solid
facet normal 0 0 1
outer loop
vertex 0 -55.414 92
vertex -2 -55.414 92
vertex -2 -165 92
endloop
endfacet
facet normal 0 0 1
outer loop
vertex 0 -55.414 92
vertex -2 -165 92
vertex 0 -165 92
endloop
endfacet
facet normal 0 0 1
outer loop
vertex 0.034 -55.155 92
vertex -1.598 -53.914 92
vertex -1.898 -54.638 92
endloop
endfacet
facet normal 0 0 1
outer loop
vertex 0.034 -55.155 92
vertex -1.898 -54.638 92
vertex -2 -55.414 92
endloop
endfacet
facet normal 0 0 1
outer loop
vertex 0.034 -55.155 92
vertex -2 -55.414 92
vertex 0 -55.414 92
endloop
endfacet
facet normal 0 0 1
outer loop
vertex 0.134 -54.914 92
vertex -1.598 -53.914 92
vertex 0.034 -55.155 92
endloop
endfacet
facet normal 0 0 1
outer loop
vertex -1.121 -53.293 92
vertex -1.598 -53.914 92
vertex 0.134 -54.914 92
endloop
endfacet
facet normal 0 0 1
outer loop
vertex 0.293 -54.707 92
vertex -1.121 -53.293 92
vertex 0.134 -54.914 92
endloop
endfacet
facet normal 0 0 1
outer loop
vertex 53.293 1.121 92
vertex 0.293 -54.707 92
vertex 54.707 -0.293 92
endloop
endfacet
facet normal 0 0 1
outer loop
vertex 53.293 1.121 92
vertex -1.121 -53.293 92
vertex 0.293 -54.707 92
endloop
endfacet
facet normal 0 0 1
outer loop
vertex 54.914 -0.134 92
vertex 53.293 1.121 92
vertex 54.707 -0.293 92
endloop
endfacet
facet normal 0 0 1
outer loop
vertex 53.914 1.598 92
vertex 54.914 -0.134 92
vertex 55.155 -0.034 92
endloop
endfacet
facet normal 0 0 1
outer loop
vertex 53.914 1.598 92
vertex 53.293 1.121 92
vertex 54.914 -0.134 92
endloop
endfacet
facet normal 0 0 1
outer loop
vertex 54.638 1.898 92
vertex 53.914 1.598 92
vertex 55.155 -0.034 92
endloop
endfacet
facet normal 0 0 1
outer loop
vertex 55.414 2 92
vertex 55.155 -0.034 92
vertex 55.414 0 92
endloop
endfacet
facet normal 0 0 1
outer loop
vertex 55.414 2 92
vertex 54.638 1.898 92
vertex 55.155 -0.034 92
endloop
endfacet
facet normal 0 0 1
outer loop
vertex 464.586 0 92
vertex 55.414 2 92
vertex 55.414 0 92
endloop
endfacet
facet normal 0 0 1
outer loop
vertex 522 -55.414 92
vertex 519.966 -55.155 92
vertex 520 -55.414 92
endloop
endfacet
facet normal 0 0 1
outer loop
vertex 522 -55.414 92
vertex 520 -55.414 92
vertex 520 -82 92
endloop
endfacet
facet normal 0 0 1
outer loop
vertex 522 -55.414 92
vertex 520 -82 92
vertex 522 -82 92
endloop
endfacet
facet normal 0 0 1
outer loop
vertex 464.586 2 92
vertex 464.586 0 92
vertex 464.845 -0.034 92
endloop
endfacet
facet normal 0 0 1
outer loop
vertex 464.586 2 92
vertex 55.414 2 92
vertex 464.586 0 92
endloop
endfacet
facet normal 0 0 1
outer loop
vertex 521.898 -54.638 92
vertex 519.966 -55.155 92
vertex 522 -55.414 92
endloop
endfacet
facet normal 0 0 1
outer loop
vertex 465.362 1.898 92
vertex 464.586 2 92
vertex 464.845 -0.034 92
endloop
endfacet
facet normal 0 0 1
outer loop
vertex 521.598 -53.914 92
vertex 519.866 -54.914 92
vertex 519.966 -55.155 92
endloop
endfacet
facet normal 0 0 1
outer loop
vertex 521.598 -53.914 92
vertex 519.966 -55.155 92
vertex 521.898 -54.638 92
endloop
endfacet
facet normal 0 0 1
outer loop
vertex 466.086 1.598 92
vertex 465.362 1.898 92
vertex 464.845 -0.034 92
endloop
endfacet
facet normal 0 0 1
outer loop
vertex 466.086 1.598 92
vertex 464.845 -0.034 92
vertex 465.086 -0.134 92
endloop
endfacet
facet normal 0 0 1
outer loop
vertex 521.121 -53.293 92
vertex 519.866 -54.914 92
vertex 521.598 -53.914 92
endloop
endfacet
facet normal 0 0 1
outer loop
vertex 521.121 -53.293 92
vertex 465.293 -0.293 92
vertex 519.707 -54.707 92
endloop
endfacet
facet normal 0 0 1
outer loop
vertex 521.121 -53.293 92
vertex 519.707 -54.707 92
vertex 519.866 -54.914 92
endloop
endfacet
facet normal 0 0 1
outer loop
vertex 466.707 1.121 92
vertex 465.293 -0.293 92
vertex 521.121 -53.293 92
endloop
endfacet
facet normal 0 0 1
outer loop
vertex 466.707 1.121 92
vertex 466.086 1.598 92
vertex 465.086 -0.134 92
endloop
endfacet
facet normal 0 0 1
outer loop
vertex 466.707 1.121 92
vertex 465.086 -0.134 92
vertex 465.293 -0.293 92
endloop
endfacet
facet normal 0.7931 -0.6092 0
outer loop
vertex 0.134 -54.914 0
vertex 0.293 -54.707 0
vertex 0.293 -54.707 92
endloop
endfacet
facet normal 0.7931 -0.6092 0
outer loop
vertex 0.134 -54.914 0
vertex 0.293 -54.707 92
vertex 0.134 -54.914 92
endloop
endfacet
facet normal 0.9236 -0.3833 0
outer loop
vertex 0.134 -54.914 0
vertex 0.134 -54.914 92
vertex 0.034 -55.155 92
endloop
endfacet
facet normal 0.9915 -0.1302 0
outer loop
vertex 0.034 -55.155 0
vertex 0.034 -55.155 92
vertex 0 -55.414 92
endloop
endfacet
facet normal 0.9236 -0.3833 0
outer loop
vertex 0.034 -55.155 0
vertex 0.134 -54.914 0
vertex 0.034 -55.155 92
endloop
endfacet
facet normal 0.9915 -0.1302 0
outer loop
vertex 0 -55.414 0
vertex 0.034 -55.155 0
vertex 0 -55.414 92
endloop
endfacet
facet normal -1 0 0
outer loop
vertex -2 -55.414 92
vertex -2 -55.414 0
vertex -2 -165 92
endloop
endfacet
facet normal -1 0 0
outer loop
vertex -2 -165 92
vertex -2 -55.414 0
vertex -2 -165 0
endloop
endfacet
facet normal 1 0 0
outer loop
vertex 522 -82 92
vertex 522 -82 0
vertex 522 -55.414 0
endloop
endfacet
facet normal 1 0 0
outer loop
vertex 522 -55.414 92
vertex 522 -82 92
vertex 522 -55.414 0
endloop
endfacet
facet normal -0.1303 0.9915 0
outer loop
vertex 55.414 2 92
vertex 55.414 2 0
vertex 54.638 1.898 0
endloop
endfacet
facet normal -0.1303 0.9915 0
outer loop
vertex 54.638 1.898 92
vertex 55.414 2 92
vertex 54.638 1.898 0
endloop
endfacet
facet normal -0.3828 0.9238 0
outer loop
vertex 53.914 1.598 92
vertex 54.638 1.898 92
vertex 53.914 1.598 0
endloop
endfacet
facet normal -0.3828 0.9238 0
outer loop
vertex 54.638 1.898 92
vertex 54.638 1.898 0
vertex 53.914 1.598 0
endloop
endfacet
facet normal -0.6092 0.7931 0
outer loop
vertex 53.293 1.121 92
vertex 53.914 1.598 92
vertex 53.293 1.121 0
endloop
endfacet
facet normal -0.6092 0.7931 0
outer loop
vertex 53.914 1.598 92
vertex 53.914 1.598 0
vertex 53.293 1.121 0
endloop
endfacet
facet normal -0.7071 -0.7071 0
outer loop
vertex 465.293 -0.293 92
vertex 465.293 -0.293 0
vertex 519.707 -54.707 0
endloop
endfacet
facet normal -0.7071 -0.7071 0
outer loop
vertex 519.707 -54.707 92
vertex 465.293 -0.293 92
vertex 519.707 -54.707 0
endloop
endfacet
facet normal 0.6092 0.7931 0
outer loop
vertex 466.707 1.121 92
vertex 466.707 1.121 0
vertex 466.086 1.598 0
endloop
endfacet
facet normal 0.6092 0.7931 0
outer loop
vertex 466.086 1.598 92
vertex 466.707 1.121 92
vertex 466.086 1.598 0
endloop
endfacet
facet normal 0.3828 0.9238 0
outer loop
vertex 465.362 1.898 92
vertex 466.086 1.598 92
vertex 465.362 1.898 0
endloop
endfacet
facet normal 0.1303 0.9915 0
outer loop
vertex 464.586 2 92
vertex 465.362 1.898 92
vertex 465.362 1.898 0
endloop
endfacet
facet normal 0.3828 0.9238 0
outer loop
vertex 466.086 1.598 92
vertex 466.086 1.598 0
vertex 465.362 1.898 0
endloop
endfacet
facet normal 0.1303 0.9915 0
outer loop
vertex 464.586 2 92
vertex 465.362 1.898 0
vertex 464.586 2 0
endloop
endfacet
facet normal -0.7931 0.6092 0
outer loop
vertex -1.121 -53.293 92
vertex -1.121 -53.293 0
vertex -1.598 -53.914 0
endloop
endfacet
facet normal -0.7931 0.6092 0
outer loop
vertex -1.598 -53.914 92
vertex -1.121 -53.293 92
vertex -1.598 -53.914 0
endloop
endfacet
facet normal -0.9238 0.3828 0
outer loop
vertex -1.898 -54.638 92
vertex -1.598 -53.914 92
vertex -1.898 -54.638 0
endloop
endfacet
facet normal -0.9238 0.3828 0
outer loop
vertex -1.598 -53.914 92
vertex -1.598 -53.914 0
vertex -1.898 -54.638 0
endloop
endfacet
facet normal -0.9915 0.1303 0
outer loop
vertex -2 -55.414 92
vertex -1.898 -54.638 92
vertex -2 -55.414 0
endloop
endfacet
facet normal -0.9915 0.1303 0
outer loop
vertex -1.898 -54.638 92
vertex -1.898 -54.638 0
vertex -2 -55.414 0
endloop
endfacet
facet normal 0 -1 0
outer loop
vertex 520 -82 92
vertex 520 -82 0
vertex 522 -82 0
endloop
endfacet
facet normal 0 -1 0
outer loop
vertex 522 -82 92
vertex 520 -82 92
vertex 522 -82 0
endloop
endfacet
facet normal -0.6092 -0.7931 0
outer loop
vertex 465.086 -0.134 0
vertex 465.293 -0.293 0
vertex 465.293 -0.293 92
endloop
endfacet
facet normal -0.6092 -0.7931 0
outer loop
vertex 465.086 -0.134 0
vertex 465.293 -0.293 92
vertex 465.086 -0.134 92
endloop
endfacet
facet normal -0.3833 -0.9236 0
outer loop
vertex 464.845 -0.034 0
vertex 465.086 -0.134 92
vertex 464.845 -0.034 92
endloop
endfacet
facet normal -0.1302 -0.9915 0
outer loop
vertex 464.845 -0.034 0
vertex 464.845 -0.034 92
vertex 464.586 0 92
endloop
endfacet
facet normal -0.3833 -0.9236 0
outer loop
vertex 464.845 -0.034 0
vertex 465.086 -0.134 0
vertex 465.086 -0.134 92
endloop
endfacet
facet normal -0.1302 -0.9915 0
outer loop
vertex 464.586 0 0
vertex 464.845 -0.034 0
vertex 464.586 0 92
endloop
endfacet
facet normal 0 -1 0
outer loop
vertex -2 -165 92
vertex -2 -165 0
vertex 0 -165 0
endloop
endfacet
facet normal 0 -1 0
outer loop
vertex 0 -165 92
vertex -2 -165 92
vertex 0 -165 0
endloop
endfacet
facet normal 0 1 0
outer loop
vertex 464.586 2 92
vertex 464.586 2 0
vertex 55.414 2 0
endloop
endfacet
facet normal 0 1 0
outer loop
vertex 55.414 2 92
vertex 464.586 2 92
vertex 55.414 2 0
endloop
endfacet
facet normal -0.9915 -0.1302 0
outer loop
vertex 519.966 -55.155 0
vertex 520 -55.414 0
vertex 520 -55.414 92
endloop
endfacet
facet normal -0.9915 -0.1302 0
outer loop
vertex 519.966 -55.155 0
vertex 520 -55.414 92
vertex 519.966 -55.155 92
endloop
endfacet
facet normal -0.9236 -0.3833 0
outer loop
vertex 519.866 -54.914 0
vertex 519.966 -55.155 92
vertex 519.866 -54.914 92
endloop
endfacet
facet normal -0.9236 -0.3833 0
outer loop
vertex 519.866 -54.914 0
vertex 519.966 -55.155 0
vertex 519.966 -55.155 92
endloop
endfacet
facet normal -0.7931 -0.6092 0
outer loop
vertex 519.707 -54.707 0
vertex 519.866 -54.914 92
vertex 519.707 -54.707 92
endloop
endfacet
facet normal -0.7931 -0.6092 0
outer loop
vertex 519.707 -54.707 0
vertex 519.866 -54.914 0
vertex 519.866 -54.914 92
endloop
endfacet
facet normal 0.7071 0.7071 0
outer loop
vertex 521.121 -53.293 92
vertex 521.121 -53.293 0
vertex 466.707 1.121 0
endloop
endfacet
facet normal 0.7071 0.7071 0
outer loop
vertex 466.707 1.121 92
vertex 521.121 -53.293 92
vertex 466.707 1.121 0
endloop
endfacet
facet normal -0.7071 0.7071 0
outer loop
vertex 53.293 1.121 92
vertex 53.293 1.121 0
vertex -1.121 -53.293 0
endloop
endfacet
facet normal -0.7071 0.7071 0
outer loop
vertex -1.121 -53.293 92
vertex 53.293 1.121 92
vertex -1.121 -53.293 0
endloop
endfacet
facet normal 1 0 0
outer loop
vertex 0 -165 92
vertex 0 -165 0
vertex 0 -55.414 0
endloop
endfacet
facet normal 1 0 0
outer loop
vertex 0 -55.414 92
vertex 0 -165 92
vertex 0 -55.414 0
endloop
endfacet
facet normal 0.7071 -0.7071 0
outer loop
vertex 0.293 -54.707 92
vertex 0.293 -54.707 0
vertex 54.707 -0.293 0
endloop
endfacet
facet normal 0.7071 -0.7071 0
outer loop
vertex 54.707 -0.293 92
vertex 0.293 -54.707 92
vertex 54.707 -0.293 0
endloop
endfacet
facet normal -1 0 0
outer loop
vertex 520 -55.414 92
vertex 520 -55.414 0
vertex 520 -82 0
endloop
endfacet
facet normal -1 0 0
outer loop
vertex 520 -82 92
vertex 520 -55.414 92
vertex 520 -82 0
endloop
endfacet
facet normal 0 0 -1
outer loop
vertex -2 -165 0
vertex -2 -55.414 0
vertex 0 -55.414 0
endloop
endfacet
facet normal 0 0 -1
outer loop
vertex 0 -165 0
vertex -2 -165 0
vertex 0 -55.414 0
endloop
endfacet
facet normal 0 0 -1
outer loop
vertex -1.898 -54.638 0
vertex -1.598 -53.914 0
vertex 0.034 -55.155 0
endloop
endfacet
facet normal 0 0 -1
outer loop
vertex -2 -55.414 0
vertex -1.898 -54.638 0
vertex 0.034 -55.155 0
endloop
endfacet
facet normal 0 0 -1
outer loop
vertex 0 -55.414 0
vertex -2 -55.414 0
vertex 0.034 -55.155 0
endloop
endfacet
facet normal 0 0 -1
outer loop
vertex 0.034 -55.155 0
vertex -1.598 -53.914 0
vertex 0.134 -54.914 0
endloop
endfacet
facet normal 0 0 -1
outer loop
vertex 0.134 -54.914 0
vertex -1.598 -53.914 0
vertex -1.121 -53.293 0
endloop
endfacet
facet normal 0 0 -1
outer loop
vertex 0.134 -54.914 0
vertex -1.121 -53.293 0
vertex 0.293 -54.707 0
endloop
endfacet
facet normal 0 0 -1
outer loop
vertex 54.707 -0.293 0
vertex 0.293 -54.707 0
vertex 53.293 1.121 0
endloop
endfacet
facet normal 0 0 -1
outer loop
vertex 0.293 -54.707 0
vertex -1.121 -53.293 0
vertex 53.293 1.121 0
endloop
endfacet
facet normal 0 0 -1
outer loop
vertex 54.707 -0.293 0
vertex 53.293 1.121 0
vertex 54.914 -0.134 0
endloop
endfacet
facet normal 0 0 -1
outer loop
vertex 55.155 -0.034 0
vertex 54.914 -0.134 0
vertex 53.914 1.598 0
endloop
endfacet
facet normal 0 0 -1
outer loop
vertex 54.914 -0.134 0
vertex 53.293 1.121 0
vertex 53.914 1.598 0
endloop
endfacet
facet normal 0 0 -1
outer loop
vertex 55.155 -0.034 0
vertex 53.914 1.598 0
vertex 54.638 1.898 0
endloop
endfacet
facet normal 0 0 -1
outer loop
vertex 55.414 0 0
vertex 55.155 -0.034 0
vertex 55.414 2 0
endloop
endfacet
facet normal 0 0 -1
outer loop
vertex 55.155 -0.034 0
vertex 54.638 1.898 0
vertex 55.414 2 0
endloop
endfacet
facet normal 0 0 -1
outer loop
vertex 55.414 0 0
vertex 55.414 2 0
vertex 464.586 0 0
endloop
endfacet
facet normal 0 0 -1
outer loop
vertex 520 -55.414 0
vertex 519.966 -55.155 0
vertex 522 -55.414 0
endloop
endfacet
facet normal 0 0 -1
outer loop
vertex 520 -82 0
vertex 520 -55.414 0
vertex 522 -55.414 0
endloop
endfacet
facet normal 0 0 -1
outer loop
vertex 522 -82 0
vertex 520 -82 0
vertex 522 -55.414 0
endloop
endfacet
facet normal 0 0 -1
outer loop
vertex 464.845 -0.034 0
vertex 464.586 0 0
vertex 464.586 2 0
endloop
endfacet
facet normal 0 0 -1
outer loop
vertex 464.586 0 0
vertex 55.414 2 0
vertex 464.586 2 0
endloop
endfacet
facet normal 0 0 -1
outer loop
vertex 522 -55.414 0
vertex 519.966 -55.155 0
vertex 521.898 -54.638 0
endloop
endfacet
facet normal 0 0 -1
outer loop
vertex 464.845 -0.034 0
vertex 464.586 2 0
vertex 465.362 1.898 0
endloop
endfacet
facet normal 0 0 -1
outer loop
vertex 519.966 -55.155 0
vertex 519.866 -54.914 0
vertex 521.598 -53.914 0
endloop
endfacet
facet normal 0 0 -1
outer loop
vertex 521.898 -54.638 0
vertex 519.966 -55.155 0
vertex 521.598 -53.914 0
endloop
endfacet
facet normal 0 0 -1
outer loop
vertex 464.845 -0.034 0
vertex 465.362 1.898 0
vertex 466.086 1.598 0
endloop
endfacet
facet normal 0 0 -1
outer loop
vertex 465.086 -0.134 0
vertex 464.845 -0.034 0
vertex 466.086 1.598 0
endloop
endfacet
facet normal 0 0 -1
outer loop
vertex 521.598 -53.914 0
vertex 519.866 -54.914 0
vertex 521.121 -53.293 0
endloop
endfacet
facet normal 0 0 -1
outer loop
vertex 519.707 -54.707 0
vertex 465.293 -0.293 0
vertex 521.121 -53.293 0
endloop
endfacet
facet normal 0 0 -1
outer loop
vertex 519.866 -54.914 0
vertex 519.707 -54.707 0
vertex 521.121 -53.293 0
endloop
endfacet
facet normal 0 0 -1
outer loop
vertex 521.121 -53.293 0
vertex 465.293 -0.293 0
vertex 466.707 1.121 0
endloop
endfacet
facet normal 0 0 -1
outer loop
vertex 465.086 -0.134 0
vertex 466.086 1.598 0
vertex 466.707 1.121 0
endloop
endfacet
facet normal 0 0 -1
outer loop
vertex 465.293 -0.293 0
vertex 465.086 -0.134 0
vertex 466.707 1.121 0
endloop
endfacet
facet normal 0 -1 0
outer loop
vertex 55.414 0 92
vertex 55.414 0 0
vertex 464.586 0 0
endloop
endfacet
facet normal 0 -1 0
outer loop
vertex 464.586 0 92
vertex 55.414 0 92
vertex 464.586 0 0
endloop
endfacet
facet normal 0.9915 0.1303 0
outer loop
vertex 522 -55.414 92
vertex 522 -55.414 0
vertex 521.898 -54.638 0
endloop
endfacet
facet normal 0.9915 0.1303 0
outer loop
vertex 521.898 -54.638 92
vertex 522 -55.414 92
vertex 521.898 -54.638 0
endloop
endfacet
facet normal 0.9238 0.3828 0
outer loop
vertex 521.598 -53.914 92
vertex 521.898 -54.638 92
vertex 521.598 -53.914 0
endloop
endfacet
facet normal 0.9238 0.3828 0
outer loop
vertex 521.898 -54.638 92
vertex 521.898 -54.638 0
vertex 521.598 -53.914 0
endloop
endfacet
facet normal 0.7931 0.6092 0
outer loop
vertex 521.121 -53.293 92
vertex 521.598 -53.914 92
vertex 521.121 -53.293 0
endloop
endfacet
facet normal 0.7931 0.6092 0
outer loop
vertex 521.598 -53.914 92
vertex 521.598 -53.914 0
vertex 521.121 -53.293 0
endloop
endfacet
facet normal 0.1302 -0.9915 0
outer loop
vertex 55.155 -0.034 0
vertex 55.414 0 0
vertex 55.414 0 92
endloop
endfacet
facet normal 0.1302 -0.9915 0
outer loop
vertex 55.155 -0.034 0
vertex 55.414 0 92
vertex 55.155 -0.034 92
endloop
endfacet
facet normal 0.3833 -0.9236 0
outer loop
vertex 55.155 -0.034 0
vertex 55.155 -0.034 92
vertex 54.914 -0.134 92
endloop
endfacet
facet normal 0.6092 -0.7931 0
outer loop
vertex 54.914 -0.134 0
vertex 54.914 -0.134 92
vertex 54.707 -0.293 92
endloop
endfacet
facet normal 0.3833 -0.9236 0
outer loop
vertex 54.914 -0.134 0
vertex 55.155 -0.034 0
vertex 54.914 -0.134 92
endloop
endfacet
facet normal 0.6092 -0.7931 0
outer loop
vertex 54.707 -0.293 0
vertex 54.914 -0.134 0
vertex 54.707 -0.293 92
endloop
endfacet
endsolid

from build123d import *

# Parameters (mm, degrees)
EXTRU_MINCE1_DEPTH        = 92
CONVERTIR_VOLUME1_DEPTH   = 92
CONVERTIR_VOLUME1_2_DEPTH = 92


# Read off the part's stored shape, not the designer's step: Convertir-Volume1
with BuildPart() as part:
    # Esquisse1 → Extru.-Mince1 (new body)
    with BuildSketch(Plane.XY):
        Polygon((520, -82), (520, -55), (465, 0), (55, 0), (0, -55), (0, -165), (10, -165), (10, -59.142135624), (59.142135624, -10), (460.857864376, -10), (510, -59.142135624), (510, -82), align=None)
    extrude(amount=EXTRU_MINCE1_DEPTH)

    # Convertir-Volume1 outline → Convertir-Volume1 (cut)
    with BuildSketch(Plane.XY):
        with BuildLine():
            Line((0, -55.414213562), (0, -165))
            Line((0, -165), (10, -165))
            Line((10, -165), (10, -59.142135624))
            Line((10, -59.142135624), (59.142135624, -10))
            Line((59.142135624, -10), (460.857864376, -10))
            Line((460.857864376, -10), (510, -59.142135624))
            Line((510, -59.142135624), (510, -82))
            Line((510, -82), (520, -82))
            Line((520, -82), (520, -55.414213562))
            ThreePointArc((520, -55.414213562), (519.923879533, -55.03153013), (519.707106781, -54.707106781))
            Line((519.707106781, -54.707106781), (465.292893219, -0.292893219))
            ThreePointArc((465.292893219, -0.292893219), (464.96846987, -0.076120467), (464.585786438, 0))
            Line((464.585786438, 0), (55.414213562, 0))
            ThreePointArc((55.414213562, 0), (55.03153013, -0.076120467), (54.707106781, -0.292893219))
            Line((54.707106781, -0.292893219), (0.292893219, -54.707106781))
            ThreePointArc((0.292893219, -54.707106781), (0.076120467, -55.03153013), (0, -55.414213562))
        make_face()
    extrude(amount=CONVERTIR_VOLUME1_DEPTH, mode=Mode.SUBTRACT)

    # Convertir-Volume1 2 outline → Convertir-Volume1 2 (add)
    with BuildSketch(Plane.XY):
        with BuildLine():
            Line((-2, -55.414213562), (-2, -165))
            Line((-2, -165), (0, -165))
            Line((0, -165), (0, -55))
            Line((0, -55), (55, 0))
            Line((55, 0), (465, 0))
            Line((465, 0), (520, -55))
            Line((520, -55), (520, -82))
            Line((520, -82), (522, -82))
            Line((522, -82), (522, -55.414213562))
            ThreePointArc((522, -55.414213562), (521.771638598, -54.266163265), (521.121320344, -53.292893219))
            Line((521.121320344, -53.292893219), (466.707106781, 1.121320344))
            ThreePointArc((466.707106781, 1.121320344), (465.733836735, 1.771638598), (464.585786438, 2))
            Line((464.585786438, 2), (55.414213562, 2))
            ThreePointArc((55.414213562, 2), (54.266163265, 1.771638598), (53.292893219, 1.121320344))
            Line((53.292893219, 1.121320344), (-1.121320344, -53.292893219))
            ThreePointArc((-1.121320344, -53.292893219), (-1.771638598, -54.266163265), (-2, -55.414213562))
        make_face()
    extrude(amount=CONVERTIR_VOLUME1_2_DEPTH)


solid = part.part
